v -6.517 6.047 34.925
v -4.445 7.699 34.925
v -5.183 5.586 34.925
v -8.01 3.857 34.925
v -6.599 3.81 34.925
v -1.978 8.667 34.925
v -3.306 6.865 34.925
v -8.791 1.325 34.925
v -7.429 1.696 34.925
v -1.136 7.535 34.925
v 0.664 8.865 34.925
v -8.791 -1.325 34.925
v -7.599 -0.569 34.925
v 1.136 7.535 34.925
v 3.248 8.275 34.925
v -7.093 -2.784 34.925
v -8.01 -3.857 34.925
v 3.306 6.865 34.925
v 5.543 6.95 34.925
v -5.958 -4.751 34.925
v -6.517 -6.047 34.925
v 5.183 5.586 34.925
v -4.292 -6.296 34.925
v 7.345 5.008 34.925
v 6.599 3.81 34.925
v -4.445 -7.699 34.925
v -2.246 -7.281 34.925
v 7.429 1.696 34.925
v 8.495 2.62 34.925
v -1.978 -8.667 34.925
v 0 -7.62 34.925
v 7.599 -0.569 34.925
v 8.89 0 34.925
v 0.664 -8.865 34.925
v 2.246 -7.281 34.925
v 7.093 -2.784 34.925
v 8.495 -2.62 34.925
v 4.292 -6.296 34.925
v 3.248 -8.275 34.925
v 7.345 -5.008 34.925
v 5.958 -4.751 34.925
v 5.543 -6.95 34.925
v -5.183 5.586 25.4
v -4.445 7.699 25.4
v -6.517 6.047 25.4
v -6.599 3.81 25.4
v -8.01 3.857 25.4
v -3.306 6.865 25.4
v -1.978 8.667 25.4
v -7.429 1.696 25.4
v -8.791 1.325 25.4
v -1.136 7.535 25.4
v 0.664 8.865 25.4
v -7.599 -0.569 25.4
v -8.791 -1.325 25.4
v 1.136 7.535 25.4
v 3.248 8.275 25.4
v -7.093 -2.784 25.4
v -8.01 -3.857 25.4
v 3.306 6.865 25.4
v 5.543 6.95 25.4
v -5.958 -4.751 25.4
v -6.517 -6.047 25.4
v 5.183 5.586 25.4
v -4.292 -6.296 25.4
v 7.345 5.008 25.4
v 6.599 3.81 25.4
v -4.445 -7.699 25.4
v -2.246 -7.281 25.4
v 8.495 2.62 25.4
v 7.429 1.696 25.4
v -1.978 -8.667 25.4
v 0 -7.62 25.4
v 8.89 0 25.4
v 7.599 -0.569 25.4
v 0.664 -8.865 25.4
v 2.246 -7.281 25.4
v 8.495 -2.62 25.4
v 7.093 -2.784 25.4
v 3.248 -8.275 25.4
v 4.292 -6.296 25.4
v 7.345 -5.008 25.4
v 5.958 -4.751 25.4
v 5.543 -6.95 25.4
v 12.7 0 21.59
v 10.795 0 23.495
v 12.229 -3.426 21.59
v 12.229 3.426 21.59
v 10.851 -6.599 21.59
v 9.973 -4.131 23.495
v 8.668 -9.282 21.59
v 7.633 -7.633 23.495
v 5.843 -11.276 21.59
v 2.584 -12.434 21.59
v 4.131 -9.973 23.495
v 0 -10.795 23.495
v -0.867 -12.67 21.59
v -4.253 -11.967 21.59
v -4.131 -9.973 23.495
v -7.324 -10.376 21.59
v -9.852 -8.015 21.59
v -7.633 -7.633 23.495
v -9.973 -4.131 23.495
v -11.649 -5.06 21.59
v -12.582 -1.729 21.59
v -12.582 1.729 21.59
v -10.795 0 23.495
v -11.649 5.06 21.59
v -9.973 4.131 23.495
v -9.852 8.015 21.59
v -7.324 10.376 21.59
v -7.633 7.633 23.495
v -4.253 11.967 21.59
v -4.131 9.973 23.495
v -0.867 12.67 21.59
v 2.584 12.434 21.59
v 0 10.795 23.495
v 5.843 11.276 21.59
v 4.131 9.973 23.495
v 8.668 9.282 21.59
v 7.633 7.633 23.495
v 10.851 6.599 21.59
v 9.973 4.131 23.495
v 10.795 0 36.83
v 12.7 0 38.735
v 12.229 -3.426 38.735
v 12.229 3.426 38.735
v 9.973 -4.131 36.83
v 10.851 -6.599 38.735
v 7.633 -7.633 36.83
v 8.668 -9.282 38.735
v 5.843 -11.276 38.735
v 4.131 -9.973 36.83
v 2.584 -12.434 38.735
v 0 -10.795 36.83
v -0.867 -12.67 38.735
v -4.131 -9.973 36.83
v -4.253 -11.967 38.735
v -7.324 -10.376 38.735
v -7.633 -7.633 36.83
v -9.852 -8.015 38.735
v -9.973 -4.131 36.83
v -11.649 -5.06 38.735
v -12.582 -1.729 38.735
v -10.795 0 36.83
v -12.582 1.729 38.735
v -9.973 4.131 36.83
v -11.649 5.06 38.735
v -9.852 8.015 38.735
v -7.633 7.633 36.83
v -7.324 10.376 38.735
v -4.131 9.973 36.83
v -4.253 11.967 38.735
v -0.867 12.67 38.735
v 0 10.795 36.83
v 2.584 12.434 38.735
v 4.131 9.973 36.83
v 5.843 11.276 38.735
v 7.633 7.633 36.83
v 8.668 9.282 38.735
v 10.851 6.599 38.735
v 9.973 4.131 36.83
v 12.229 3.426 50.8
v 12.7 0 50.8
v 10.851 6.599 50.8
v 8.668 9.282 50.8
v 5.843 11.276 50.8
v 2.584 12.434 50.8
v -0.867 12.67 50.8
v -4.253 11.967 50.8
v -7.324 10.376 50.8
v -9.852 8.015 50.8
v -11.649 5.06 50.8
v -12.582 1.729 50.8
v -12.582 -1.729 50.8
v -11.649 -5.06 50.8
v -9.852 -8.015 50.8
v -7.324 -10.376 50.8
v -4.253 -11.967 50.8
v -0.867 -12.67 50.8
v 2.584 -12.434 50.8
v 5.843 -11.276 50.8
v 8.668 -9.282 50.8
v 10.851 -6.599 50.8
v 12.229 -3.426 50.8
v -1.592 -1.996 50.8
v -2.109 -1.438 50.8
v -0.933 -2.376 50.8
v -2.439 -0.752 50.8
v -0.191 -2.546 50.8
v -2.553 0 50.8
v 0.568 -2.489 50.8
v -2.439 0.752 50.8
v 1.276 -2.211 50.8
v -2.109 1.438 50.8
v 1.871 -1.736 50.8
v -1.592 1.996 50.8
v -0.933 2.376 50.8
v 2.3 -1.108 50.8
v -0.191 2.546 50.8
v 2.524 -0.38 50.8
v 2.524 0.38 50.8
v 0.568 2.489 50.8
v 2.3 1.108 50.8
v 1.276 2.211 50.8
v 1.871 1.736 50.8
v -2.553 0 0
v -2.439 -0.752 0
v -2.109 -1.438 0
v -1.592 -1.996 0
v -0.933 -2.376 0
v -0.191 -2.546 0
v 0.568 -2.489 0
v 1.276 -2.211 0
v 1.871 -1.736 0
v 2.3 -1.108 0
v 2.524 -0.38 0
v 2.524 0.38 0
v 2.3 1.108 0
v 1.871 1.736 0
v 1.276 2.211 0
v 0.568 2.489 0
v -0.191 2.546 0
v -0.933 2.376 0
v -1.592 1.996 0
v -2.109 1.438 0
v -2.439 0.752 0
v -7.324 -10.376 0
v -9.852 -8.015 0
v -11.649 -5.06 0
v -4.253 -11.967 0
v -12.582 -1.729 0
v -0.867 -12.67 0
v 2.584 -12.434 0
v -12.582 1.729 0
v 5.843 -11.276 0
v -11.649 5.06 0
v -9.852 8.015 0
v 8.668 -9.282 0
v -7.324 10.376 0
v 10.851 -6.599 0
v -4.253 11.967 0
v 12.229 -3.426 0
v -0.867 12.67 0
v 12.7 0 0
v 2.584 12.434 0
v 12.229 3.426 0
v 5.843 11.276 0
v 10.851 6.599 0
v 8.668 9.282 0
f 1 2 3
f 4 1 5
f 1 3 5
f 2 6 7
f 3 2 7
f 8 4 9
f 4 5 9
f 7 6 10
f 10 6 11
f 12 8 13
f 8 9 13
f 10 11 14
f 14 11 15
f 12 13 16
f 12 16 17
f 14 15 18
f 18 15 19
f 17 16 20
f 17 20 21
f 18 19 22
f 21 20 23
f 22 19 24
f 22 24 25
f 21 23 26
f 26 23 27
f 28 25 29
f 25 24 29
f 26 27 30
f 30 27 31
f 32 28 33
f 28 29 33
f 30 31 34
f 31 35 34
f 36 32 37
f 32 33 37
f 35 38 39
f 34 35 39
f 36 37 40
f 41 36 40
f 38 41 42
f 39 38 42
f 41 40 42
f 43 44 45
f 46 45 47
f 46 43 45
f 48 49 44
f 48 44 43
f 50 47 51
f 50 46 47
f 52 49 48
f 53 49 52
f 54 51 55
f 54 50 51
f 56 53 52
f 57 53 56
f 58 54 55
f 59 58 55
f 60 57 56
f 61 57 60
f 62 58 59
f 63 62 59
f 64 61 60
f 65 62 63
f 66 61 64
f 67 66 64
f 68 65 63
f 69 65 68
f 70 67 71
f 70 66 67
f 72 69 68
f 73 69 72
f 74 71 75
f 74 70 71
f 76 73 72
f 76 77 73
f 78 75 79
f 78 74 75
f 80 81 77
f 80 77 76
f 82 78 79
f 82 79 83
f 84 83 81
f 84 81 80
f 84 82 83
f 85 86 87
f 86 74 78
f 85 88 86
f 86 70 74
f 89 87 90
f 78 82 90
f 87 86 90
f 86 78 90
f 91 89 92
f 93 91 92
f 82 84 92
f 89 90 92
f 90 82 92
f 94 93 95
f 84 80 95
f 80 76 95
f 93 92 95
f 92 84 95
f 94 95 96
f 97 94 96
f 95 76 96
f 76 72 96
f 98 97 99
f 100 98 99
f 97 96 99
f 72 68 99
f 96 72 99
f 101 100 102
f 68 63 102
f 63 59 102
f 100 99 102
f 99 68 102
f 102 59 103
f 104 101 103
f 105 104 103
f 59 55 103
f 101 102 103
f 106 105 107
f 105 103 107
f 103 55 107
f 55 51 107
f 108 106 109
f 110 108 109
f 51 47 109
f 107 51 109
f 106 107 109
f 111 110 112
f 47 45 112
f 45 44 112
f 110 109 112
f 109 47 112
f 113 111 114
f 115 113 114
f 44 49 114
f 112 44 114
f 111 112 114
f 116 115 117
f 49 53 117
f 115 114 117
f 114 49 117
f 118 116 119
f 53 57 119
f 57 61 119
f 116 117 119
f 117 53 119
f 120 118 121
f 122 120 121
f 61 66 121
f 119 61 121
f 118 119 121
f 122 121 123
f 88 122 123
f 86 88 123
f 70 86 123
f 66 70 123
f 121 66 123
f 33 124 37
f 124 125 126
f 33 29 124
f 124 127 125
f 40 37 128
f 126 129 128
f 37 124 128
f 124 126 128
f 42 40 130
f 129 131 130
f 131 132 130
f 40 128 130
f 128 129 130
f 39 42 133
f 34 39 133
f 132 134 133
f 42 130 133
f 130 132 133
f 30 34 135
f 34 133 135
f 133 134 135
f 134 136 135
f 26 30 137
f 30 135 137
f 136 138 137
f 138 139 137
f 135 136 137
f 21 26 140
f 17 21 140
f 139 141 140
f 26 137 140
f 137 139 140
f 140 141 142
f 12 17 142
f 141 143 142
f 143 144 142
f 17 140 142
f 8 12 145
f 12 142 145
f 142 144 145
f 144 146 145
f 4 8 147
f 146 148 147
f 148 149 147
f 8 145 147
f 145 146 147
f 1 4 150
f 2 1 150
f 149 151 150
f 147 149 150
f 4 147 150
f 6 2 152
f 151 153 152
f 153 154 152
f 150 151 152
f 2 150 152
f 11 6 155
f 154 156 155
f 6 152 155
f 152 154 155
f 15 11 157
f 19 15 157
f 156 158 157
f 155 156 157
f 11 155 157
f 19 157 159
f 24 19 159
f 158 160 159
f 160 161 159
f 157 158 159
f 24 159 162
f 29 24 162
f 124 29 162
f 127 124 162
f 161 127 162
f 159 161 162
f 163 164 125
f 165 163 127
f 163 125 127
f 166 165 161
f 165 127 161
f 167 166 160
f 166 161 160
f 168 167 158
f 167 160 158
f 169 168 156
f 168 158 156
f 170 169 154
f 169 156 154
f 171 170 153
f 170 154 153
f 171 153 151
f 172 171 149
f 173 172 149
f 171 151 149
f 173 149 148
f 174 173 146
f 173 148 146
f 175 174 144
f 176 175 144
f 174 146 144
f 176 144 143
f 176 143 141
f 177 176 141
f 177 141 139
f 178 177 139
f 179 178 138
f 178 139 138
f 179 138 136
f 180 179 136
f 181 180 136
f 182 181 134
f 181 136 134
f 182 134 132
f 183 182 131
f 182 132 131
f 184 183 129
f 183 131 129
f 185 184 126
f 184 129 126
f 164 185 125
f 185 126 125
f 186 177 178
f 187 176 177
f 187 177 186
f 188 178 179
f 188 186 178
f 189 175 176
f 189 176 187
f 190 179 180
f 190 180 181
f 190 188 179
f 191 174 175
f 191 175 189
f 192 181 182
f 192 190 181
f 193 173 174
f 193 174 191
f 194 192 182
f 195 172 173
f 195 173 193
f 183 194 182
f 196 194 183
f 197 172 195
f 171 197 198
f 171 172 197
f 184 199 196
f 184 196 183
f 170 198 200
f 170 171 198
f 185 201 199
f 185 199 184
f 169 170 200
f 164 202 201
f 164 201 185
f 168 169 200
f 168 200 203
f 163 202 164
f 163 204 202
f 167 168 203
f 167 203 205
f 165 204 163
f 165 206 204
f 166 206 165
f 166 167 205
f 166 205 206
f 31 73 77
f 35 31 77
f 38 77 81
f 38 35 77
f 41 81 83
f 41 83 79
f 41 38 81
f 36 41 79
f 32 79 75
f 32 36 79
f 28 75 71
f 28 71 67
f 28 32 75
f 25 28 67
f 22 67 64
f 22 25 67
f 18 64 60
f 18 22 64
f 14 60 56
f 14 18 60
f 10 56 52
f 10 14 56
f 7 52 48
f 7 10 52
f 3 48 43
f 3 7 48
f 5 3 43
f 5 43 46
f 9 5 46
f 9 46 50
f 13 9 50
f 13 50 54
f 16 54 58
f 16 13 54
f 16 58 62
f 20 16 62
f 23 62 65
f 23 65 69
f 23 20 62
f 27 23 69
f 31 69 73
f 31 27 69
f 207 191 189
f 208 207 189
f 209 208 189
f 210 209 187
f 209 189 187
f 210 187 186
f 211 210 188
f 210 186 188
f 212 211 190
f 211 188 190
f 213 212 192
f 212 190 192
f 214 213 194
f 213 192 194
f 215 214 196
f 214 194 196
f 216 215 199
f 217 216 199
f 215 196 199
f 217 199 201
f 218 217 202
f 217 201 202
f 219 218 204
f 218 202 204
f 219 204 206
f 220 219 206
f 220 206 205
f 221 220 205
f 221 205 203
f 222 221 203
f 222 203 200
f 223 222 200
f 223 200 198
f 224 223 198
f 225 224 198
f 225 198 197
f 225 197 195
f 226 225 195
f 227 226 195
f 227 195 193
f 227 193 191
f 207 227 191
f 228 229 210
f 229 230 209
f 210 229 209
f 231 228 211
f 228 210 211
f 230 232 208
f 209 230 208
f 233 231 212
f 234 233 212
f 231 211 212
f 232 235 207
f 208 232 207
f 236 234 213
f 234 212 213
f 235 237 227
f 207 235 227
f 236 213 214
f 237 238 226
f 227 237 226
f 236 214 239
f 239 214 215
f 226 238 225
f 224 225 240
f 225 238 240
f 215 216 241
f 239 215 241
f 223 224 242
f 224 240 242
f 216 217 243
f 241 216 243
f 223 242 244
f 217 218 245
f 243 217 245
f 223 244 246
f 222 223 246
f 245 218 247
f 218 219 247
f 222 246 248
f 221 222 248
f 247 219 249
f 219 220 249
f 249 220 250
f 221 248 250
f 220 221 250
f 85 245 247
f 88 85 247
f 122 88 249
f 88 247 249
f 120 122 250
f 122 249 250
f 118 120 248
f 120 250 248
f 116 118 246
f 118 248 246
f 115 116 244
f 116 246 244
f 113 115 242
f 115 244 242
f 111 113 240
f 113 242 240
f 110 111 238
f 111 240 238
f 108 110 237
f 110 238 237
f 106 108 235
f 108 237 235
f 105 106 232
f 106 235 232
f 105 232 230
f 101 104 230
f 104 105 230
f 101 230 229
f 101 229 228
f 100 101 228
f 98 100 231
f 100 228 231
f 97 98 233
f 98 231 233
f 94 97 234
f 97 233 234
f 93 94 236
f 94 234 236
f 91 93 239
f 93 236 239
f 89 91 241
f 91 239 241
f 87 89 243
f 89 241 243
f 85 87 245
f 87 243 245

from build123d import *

# Parameters (mm, degrees)
F0_R     = 12.7
F1_DEPTH = 50.8
F2_W     = 5.08
F2_H     = 9.525
F4_SIZE  = 3.81
F6_D     = 5.1054


with BuildPart() as f1:
    # F0 (on Top) → F1 (new body)
    with BuildSketch(Plane.XY):
        Circle(F0_R)
    extrude(amount=F1_DEPTH)

    # F2 (on Right) → F3 (revolve, cut)
    with BuildSketch(Plane.YZ):
        with Locations((-10.16, 30.1625)):
            Rectangle(F2_W, F2_H)
    revolve(axis=Axis((0, 0, 34.6962809563), (0, 0, 1)), mode=Mode.SUBTRACT)

    # F4
    f4_edges = [f1.edges().sort_by_distance(p)[0] for p in [
        (-12.7, 0, 34.925),
        (-12.7, 0, 25.4),
    ]]
    chamfer(f4_edges, length=F4_SIZE)

    # F6 (through all)
    with Locations(Plane(origin=(0, 0, 0), x_dir=(1, 0, 0), z_dir=(0, 0, -1))):
        with Locations((0, 0)):
            Hole(F6_D / 2)


solid = f1.part
